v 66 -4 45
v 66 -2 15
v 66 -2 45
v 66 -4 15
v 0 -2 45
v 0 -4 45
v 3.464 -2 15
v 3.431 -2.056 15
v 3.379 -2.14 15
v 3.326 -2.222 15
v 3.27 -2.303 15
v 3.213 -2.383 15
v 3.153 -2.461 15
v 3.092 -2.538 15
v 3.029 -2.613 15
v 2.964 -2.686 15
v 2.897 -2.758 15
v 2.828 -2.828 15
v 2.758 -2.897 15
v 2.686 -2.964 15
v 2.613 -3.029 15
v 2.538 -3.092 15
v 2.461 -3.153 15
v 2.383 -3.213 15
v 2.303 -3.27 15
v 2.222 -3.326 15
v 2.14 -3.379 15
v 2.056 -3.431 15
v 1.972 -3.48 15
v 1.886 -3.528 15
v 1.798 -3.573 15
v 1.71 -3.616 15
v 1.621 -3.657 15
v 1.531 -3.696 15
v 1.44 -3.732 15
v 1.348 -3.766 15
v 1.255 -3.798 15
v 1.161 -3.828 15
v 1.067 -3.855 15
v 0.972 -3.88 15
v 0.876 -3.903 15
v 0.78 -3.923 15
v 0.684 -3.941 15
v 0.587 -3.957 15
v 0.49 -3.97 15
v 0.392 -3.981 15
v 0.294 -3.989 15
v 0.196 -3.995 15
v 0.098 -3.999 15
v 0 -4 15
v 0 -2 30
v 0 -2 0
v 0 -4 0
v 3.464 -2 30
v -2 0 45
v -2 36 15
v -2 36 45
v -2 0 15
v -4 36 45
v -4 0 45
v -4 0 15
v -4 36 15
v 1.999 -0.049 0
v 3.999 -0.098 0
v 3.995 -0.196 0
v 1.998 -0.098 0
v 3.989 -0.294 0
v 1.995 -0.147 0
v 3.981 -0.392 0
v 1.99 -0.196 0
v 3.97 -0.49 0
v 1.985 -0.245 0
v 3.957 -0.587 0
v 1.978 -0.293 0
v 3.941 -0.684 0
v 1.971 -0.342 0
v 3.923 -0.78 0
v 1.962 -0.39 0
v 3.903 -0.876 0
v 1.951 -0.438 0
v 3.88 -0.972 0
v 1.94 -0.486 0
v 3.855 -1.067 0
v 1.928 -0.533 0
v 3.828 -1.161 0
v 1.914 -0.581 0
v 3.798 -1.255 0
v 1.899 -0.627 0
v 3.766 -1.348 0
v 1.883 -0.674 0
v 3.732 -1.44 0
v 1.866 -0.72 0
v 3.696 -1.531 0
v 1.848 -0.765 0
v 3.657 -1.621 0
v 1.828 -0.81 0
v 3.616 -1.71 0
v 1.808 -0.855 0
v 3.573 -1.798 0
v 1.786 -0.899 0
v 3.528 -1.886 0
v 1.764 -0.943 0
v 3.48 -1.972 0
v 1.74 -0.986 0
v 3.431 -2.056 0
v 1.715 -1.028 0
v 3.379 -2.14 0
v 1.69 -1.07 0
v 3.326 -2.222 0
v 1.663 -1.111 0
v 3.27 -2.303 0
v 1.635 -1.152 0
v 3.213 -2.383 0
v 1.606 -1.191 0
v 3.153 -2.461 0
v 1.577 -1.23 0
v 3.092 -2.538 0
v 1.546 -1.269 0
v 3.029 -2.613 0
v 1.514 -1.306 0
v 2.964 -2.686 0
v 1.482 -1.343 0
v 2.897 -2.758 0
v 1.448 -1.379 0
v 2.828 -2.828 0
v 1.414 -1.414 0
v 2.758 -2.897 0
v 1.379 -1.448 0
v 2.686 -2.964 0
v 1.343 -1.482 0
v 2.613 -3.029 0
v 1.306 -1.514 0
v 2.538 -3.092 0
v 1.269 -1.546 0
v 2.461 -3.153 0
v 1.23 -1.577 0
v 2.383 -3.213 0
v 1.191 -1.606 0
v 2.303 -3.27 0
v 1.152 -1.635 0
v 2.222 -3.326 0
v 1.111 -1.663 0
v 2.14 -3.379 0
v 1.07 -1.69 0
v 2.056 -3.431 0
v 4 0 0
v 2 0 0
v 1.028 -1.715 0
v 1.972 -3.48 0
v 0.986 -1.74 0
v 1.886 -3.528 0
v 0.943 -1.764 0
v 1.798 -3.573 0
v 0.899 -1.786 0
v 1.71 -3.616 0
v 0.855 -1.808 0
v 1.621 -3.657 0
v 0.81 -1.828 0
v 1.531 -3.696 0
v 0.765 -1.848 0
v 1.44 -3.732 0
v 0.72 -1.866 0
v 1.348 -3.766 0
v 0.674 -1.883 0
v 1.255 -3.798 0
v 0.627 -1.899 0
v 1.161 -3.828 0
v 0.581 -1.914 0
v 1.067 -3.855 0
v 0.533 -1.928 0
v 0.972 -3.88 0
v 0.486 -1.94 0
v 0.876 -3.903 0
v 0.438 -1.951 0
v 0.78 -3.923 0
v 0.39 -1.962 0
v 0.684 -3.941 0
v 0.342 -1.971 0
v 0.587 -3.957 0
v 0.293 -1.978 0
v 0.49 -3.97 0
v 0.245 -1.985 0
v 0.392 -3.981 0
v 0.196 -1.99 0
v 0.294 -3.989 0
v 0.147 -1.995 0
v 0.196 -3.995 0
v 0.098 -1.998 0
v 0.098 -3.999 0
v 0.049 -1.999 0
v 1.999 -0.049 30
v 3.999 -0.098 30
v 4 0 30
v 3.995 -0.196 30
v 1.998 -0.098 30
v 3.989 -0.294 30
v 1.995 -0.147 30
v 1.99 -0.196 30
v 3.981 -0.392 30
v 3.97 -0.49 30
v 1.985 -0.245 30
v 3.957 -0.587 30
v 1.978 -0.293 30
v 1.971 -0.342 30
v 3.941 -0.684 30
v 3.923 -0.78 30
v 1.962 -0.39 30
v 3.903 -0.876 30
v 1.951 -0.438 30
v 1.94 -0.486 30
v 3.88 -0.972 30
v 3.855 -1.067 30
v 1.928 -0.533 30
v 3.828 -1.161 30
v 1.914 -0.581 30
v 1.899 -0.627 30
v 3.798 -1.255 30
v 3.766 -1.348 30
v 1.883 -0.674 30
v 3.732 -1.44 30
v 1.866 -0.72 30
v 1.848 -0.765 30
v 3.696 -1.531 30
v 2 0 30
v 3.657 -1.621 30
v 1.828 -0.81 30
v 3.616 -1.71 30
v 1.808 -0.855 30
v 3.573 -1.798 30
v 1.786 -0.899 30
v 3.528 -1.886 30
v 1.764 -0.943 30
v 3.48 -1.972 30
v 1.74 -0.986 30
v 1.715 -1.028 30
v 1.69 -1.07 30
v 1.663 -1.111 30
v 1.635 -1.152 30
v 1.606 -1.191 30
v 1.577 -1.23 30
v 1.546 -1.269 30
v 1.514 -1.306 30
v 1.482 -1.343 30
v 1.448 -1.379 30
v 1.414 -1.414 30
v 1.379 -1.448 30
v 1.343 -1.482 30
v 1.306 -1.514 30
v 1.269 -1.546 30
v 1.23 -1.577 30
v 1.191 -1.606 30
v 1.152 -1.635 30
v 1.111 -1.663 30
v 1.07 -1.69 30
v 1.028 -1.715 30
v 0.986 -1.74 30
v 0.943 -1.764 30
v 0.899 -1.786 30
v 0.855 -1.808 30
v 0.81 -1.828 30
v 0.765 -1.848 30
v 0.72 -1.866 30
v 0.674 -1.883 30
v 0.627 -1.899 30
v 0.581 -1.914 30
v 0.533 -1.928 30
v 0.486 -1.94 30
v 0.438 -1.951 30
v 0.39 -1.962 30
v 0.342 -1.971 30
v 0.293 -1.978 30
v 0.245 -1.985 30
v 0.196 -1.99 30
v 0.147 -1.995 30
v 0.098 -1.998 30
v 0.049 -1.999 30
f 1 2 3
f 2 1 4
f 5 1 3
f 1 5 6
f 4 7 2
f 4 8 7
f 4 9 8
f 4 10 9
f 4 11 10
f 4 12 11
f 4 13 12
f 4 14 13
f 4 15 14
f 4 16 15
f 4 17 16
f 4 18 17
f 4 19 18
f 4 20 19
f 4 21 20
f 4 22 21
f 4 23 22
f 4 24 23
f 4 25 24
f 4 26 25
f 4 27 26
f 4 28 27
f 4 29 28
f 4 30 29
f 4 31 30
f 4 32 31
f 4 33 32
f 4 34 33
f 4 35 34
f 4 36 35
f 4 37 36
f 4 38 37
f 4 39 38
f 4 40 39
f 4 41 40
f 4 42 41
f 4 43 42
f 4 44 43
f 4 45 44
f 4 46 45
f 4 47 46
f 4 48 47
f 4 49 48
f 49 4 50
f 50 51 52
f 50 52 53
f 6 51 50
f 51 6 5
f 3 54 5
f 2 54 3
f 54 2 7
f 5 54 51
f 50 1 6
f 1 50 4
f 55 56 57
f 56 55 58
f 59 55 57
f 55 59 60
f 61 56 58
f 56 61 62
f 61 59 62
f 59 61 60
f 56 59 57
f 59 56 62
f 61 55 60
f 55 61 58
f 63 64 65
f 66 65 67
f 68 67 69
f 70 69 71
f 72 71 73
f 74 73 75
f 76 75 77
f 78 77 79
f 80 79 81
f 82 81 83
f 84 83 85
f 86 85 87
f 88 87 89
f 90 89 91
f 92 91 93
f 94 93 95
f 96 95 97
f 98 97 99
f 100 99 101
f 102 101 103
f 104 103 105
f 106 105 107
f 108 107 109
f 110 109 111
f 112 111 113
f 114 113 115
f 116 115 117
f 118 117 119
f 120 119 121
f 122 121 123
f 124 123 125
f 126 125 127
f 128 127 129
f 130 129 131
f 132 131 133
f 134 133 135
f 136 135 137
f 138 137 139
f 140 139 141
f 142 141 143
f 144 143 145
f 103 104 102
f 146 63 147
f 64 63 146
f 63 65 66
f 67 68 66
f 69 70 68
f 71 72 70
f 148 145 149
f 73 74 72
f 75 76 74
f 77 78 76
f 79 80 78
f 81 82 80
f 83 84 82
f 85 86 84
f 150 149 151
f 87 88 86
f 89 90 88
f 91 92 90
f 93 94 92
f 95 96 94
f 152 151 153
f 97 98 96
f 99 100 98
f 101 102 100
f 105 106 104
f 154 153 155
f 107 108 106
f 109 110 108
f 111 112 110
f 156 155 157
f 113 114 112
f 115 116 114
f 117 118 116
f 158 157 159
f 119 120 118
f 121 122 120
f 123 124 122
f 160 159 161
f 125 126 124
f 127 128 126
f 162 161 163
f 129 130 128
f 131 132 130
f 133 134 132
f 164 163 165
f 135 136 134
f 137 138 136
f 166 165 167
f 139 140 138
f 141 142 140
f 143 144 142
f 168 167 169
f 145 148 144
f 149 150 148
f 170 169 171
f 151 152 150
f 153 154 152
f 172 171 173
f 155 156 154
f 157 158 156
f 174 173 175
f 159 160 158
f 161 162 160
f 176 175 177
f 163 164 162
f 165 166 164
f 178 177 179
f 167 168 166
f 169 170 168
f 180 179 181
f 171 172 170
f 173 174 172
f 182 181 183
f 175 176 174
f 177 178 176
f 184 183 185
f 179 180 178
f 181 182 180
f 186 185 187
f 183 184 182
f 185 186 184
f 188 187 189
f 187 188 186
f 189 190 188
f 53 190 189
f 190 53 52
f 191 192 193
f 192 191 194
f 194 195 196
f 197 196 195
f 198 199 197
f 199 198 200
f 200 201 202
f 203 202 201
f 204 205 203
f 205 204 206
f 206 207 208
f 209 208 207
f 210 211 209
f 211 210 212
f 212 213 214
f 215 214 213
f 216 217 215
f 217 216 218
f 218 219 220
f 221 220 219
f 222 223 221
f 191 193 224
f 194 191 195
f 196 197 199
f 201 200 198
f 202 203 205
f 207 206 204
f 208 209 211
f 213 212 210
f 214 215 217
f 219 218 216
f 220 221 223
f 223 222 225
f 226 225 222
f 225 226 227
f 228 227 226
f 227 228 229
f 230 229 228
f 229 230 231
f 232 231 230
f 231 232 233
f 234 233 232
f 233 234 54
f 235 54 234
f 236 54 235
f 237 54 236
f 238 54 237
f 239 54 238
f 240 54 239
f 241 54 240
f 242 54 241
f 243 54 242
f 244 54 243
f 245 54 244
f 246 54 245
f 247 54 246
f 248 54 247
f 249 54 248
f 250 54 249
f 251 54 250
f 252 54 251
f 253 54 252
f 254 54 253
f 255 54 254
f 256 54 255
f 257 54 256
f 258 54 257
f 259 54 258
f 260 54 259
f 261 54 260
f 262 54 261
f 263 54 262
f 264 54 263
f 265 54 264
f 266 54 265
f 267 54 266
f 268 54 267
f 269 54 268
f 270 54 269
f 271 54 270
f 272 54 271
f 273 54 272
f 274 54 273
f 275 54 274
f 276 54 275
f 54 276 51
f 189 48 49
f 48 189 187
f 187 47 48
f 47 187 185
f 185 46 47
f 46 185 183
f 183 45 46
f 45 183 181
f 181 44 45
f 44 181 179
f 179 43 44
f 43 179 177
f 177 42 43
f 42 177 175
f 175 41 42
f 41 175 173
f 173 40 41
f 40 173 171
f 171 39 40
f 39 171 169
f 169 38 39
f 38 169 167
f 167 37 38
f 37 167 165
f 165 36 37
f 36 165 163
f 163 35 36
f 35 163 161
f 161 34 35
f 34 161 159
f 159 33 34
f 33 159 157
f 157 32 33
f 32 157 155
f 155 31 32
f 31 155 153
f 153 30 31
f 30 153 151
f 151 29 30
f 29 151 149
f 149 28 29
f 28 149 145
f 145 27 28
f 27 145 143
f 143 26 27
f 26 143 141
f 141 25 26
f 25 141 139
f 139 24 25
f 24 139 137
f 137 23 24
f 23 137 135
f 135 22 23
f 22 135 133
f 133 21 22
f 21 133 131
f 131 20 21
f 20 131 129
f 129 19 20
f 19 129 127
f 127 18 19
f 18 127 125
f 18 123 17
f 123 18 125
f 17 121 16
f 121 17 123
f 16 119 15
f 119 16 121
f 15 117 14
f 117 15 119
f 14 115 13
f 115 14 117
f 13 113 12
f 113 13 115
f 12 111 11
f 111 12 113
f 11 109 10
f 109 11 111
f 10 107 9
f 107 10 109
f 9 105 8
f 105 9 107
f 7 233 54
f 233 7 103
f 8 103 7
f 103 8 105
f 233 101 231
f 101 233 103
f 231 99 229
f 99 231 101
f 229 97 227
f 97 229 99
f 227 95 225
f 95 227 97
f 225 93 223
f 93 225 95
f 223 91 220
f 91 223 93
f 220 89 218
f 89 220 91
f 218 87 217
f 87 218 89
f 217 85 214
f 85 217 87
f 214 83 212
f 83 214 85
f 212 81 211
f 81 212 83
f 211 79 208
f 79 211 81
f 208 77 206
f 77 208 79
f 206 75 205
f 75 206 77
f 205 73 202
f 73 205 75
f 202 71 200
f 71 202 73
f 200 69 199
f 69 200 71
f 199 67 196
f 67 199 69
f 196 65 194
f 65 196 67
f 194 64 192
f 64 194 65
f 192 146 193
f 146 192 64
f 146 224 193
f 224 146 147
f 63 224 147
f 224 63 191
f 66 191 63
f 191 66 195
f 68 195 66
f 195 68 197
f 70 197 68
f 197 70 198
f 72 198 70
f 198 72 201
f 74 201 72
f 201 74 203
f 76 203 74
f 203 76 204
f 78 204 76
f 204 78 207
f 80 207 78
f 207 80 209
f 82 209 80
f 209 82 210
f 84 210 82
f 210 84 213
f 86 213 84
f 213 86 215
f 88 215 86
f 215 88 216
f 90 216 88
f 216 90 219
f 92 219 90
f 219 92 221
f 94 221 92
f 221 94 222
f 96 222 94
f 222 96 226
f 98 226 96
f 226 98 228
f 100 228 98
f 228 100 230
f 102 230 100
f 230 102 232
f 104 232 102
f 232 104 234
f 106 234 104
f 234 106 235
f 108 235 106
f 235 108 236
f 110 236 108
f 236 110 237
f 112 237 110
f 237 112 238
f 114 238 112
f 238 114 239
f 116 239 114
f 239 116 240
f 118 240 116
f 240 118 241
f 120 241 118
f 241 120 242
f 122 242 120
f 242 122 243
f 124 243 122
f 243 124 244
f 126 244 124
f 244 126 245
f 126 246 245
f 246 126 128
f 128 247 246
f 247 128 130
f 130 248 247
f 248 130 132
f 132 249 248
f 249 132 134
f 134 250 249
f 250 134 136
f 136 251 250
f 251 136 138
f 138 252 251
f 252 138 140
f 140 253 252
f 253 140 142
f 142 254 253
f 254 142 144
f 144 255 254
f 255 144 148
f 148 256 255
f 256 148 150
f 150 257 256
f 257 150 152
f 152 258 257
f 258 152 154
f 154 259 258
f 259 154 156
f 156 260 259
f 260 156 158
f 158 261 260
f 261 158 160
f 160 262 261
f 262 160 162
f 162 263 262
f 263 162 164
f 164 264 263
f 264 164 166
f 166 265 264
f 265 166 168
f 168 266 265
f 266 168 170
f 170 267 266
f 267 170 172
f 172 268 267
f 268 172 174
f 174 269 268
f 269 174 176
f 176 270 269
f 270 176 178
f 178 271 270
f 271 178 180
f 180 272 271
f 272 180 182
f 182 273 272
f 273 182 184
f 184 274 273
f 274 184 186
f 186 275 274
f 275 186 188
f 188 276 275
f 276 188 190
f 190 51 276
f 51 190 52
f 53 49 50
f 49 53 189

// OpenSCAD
// Units: mm

thickness_mm = 2.0;
bend_radius_mm = 2.0;
k_factor = 0.45;
bend_angle_deg = 90;
bend_angle_rad = bend_angle_deg * PI / 180;

outside_flange_A_mm = 70.0;
outside_flange_B_mm = 40.0;
width_mm = 30.0;

outside_radius_mm = bend_radius_mm + thickness_mm;
outside_setback_mm = (bend_radius_mm + thickness_mm) * tan(bend_angle_deg / 2);
bend_allowance_mm = bend_angle_rad * (bend_radius_mm + k_factor * thickness_mm);
developed_flat_length_mm =
    outside_flange_A_mm + outside_flange_B_mm
    - (2 * outside_setback_mm - bend_allowance_mm);

$fn = 96;

echo(str(
    "MAKERBENCH-SHEETMETAL: {",
    "\"thickness_mm\":", thickness_mm, ",",
    "\"bend_radius_mm\":", bend_radius_mm, ",",
    "\"developed_flat_length_mm\":", developed_flat_length_mm,
    "}"
));

module annular_bend_segment(r_inner, r_outer, width, steps = 64) {
    points_outer = [
        for (i = [0:steps])
            let(a = -90 + i * 90 / steps)
            [r_outer * cos(a), r_outer * sin(a)]
    ];

    points_inner = [
        for (i = [steps:-1:0])
            let(a = -90 + i * 90 / steps)
            [r_inner * cos(a), r_inner * sin(a)]
    ];

    linear_extrude(height = width, center = true)
        polygon(concat(points_outer, points_inner));
}

module straight_flange_A() {
    translate([0, -outside_radius_mm, 0])
        cube([
            outside_flange_A_mm - outside_setback_mm,
            thickness_mm,
            width_mm
        ], center = false);
}

module straight_flange_B() {
    translate([-outside_radius_mm, 0, 0])
        cube([
            thickness_mm,
            outside_flange_B_mm - outside_setback_mm,
            width_mm
        ], center = false);
}

module formed_l_bracket() {
    translate([0, 0, width_mm / 2]) {
        straight_flange_A();
        straight_flange_B();
        annular_bend_segment(
            bend_radius_mm,
            outside_radius_mm,
            width_mm
        );
    }
}

formed_l_bracket();
